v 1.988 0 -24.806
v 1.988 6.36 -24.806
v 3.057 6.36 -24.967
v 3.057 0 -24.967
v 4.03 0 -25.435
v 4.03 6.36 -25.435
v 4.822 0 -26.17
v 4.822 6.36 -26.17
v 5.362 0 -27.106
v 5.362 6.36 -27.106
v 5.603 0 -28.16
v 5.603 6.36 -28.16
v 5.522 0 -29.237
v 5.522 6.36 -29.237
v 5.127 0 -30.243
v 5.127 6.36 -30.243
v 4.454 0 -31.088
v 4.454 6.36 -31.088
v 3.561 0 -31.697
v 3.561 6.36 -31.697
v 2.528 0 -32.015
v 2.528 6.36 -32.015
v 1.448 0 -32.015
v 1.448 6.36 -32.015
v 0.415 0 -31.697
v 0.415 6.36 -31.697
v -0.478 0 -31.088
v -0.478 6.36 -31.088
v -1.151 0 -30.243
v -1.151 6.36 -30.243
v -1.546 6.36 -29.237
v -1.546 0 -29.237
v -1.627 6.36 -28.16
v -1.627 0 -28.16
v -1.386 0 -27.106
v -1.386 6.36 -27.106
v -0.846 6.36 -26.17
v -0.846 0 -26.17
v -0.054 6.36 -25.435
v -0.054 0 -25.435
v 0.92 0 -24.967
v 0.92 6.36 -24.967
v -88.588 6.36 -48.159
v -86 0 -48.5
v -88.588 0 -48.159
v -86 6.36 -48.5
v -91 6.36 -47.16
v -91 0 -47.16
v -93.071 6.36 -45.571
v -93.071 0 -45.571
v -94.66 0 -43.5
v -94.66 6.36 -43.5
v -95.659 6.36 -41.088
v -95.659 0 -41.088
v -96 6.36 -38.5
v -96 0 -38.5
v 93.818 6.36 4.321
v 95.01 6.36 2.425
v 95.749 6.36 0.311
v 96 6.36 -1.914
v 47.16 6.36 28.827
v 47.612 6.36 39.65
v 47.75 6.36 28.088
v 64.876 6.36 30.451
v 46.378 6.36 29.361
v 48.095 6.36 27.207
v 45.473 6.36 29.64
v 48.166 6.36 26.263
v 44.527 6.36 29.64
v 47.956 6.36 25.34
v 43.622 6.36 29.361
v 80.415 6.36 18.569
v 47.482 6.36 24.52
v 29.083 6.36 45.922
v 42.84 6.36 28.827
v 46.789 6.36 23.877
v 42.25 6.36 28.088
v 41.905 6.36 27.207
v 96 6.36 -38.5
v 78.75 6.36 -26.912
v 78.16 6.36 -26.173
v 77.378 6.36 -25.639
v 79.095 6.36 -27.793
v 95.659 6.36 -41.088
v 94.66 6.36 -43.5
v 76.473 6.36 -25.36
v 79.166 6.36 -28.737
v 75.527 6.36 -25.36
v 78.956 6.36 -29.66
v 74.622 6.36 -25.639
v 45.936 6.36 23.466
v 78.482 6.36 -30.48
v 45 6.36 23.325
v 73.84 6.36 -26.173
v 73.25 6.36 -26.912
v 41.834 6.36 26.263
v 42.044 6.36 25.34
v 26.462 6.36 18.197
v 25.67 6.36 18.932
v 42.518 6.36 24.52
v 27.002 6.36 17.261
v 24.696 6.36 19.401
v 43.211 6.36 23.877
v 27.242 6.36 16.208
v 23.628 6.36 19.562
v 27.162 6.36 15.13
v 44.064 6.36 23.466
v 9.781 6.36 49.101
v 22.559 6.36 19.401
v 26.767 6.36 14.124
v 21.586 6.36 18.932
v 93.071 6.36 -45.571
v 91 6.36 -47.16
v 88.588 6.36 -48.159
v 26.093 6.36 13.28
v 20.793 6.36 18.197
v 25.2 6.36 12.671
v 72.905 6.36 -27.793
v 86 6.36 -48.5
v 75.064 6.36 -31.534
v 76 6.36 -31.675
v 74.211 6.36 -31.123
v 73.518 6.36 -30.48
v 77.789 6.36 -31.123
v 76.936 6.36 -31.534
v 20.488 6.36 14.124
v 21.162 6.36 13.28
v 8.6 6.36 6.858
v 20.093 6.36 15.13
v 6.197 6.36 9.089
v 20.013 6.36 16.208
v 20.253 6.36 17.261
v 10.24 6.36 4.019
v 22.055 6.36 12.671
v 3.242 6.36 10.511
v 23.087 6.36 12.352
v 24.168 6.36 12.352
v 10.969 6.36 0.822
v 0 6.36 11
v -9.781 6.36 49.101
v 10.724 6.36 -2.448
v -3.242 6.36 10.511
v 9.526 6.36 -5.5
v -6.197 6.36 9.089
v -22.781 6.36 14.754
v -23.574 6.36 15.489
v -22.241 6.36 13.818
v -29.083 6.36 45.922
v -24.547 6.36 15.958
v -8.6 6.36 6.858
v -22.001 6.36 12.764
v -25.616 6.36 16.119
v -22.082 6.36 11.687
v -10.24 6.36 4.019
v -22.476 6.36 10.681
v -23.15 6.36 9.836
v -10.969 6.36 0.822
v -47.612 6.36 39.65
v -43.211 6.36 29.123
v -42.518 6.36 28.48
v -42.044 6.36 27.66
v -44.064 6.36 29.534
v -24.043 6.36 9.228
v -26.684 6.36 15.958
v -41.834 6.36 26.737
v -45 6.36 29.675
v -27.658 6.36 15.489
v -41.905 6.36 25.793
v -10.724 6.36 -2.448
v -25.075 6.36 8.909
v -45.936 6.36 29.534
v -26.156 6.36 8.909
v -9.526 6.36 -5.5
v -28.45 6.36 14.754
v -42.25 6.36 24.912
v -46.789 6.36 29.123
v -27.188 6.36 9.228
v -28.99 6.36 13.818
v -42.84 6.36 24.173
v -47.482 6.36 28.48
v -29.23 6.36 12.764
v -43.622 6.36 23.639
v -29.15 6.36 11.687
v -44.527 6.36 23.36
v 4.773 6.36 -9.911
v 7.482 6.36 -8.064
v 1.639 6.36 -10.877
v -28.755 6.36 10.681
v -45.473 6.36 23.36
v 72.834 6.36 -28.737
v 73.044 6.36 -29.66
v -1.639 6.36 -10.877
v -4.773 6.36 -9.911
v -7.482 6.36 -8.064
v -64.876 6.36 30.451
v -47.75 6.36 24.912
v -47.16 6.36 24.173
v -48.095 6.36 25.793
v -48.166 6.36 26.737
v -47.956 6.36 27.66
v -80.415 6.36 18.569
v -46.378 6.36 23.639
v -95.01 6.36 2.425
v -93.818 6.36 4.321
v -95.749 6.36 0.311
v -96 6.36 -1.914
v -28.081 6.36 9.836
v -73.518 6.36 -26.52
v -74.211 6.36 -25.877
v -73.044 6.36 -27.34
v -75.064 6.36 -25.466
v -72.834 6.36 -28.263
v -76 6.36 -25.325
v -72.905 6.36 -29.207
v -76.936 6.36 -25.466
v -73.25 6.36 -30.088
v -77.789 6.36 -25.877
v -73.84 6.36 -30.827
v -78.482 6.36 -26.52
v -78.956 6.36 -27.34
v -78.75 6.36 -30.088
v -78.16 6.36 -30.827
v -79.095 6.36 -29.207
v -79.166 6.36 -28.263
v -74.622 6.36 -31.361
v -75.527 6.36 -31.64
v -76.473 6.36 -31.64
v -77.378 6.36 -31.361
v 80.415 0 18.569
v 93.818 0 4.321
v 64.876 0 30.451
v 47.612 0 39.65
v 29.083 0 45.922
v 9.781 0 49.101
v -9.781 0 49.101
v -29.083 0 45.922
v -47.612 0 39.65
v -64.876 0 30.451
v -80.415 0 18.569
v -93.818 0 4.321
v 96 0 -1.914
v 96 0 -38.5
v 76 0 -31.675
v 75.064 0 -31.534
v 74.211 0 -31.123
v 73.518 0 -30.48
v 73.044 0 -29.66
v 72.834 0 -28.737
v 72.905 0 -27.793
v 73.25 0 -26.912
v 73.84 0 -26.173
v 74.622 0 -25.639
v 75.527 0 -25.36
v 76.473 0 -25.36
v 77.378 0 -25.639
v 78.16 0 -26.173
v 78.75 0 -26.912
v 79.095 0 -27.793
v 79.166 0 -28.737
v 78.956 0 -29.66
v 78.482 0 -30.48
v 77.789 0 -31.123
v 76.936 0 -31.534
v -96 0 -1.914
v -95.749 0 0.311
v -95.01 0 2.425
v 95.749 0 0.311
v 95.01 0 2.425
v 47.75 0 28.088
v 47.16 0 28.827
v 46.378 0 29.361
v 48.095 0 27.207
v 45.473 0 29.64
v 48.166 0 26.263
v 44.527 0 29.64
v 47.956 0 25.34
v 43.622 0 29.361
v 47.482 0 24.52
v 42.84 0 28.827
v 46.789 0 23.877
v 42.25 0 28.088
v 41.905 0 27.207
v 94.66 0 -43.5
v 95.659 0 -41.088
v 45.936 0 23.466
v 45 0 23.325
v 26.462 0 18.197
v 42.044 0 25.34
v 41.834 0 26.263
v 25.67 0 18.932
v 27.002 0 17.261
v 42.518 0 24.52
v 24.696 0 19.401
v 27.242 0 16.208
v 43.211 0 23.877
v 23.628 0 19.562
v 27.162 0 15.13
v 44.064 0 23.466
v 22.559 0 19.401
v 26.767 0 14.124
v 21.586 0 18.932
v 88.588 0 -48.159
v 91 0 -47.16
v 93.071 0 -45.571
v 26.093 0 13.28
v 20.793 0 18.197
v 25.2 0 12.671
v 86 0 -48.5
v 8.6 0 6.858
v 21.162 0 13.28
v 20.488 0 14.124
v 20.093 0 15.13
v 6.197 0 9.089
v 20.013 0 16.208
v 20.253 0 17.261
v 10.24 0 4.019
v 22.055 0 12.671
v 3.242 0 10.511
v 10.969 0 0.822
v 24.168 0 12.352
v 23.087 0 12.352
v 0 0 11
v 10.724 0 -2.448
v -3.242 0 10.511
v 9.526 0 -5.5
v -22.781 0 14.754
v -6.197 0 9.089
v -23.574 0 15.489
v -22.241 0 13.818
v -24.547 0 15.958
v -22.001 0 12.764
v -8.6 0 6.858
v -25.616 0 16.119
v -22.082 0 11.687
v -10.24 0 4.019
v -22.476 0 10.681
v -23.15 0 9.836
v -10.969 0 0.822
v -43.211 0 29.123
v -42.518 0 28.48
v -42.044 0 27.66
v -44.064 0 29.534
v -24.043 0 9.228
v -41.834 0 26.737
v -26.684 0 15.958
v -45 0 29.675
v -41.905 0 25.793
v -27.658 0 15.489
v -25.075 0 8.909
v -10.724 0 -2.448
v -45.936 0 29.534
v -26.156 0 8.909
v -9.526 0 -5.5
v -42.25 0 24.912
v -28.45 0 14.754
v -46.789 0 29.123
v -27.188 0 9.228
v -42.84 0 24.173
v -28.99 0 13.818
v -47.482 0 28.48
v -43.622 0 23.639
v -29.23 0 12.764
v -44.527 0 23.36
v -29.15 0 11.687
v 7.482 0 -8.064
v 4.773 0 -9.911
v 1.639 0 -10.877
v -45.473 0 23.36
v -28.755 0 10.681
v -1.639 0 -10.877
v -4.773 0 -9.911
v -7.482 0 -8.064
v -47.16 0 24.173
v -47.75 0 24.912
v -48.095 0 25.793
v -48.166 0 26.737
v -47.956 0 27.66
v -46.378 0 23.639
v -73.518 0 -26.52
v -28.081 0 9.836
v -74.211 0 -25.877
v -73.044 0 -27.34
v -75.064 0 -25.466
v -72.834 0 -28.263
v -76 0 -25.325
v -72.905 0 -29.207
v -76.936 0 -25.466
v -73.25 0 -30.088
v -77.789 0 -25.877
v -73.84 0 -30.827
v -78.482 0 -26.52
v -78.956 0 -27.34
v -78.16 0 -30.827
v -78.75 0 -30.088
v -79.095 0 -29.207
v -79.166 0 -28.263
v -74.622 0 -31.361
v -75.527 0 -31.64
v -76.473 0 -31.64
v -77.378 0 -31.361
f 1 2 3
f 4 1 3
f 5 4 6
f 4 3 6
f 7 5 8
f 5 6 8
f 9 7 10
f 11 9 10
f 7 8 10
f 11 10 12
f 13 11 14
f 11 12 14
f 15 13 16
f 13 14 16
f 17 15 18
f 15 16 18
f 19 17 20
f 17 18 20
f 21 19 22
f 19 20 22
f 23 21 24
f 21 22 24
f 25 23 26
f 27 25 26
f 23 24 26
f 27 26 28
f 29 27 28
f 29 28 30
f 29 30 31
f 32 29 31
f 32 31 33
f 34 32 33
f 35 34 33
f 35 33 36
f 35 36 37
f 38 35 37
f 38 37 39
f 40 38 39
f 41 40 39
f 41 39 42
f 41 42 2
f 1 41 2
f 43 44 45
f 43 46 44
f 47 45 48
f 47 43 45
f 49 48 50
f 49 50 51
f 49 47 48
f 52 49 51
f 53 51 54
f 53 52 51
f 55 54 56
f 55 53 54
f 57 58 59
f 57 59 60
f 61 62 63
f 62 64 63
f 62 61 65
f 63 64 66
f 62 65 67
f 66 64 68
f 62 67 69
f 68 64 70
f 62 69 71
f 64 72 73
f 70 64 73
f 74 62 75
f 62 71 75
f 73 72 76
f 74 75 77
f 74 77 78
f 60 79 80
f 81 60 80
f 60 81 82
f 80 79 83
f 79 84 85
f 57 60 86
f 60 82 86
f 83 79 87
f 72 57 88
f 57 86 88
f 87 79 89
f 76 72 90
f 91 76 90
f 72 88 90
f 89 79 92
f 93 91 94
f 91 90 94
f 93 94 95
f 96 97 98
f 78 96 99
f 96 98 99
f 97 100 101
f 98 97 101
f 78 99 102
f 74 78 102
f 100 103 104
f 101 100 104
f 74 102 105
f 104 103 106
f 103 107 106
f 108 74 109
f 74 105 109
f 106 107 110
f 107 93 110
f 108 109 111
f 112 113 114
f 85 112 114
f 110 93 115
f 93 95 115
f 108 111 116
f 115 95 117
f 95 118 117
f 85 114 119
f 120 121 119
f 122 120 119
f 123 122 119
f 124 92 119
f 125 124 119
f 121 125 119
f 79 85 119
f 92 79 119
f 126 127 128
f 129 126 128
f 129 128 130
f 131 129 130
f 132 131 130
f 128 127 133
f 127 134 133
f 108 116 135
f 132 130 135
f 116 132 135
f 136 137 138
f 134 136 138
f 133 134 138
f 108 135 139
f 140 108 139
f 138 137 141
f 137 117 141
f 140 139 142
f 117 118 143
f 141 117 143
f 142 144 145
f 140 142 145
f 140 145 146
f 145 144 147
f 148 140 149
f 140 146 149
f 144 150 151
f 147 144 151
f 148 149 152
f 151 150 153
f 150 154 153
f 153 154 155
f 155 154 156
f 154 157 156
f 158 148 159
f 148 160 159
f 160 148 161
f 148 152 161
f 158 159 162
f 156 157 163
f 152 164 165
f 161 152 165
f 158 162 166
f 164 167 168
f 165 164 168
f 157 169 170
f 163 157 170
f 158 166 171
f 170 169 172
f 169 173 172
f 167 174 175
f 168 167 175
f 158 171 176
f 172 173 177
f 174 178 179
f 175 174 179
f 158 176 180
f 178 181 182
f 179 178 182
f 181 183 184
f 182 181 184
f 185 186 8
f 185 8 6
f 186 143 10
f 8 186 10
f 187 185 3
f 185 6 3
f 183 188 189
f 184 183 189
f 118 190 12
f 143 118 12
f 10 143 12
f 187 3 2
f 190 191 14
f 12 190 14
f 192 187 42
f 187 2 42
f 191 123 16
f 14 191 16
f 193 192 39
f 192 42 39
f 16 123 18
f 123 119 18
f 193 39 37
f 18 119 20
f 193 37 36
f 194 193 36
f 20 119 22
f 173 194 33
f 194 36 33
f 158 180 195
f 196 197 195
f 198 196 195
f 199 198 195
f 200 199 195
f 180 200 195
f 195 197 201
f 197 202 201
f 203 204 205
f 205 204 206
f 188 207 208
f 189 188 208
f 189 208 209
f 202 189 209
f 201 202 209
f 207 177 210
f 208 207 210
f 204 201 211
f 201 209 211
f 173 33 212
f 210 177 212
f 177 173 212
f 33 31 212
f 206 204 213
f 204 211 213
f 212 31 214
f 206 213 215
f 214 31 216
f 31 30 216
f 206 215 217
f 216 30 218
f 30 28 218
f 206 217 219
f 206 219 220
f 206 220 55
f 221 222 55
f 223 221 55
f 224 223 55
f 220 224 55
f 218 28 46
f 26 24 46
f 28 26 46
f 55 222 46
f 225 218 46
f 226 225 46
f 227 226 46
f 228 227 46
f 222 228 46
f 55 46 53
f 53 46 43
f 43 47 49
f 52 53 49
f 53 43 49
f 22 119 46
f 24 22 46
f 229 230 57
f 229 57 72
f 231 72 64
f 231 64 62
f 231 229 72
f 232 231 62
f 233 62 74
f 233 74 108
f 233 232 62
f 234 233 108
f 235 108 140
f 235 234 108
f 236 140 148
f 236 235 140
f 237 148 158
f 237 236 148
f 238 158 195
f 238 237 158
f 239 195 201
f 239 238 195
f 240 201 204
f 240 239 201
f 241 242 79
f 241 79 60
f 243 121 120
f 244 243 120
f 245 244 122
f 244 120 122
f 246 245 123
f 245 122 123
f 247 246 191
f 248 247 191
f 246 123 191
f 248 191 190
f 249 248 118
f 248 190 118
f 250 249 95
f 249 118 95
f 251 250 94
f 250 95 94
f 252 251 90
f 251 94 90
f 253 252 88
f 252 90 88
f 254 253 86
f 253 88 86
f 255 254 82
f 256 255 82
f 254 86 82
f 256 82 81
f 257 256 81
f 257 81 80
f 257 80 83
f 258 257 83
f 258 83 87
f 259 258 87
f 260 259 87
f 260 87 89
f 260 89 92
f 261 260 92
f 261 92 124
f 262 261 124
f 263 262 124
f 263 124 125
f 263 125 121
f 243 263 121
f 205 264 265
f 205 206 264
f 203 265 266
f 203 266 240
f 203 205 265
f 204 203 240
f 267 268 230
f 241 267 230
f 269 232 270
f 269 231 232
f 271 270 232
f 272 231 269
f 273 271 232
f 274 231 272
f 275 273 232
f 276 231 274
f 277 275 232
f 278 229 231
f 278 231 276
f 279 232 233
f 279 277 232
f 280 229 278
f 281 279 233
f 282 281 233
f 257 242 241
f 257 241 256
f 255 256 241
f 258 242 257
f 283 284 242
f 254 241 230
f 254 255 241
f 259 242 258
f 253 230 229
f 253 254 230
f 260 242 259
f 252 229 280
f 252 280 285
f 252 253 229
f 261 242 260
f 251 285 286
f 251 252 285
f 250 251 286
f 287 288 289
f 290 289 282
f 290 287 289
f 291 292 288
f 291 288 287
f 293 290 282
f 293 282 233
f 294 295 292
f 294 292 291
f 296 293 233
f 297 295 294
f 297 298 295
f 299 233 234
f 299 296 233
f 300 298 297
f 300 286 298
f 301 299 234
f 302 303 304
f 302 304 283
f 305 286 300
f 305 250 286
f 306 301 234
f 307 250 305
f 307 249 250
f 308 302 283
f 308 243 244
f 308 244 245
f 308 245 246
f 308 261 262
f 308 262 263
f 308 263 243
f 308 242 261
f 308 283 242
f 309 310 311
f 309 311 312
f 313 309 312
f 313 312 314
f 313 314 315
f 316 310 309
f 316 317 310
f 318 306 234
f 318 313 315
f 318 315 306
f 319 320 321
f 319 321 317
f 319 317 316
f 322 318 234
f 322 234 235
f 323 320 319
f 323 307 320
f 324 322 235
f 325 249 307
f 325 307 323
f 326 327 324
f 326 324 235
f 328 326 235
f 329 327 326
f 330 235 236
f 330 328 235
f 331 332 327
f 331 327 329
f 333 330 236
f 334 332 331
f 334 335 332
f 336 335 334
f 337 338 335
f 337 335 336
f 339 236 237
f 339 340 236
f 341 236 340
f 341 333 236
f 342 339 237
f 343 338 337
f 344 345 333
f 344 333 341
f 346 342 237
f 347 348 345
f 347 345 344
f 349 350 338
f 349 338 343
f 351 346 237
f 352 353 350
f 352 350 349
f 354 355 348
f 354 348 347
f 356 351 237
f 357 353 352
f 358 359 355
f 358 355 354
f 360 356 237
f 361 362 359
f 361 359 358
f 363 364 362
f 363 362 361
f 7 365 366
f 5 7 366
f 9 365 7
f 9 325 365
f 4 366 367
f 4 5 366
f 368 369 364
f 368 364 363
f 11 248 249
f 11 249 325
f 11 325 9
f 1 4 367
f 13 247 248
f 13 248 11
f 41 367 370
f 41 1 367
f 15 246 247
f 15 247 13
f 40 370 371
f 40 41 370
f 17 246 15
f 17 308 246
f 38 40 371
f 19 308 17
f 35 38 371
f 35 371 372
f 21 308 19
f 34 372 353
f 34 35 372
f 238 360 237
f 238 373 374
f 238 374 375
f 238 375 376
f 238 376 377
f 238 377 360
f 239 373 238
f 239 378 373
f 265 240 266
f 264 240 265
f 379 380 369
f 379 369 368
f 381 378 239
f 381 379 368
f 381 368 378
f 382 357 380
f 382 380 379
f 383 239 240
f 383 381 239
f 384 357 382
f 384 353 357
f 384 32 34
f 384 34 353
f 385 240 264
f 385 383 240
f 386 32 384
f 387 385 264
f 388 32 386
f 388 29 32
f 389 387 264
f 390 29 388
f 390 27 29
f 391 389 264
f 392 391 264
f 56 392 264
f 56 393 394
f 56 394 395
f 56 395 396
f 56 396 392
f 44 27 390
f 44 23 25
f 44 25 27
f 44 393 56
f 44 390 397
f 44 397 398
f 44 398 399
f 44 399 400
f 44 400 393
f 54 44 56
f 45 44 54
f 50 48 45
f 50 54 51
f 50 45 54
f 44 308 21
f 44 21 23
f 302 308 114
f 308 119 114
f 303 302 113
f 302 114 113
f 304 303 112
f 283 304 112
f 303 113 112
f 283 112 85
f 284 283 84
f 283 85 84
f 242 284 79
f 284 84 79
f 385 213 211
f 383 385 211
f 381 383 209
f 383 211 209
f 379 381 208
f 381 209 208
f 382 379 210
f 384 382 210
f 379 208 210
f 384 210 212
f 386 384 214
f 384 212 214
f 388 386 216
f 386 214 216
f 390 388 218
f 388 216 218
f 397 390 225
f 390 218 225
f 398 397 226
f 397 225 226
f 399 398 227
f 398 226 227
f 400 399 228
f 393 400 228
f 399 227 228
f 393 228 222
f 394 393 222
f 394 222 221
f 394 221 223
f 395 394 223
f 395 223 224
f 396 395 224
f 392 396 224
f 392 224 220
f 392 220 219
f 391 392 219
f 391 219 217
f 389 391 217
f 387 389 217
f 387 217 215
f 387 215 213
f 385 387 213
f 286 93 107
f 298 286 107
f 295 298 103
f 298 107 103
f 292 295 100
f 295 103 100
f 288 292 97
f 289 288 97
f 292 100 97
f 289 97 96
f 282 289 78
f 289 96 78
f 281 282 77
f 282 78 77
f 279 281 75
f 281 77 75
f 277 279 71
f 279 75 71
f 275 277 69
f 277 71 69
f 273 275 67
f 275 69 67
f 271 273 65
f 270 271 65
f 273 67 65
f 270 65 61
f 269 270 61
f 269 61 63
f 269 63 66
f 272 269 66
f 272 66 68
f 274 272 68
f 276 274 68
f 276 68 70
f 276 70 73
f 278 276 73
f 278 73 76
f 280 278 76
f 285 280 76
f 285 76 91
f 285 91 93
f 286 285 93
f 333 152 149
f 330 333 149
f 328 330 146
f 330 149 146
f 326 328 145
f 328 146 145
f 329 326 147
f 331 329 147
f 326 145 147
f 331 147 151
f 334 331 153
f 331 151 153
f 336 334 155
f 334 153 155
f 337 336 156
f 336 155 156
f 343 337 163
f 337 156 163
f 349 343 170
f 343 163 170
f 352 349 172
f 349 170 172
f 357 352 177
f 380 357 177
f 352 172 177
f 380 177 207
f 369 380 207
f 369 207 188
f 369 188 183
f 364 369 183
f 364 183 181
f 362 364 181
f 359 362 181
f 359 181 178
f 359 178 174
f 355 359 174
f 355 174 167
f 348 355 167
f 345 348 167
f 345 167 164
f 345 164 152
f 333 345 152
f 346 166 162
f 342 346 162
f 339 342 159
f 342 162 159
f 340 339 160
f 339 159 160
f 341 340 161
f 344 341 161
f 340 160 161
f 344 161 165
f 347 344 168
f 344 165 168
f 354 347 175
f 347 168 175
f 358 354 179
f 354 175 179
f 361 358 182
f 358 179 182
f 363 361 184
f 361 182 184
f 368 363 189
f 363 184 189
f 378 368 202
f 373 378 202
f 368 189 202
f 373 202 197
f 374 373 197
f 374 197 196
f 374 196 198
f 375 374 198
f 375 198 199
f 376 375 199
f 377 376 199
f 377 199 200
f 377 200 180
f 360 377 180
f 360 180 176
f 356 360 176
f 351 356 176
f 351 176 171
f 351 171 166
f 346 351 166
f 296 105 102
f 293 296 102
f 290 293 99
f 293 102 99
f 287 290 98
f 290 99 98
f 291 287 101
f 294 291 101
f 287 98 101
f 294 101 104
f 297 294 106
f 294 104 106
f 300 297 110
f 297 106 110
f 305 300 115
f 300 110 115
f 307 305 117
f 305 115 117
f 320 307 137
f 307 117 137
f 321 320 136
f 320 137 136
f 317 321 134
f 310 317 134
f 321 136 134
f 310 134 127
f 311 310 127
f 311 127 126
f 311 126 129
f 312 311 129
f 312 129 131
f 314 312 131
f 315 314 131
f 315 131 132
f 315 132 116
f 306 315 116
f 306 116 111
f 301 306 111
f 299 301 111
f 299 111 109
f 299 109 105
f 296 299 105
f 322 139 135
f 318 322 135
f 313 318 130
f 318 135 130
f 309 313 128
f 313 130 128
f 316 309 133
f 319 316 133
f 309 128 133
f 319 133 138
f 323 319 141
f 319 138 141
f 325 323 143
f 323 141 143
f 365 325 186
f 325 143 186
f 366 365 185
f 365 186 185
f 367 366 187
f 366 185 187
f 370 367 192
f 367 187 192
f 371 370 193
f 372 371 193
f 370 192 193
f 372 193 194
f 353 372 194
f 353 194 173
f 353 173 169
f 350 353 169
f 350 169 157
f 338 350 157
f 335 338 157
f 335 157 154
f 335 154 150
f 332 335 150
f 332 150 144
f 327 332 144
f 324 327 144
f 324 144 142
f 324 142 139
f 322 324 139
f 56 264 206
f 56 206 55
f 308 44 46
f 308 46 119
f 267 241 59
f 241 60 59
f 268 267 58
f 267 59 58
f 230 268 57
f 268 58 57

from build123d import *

# Parameters (mm, degrees)
SKETCH5_R           = 38.5
BOSS_EXTRUDE2_DEPTH = 6.36
SKETCH8_R           = 11
CUT_EXTRUDE4_DEPTH  = 55.817420589
BOSS_EXTRUDE3_START = -6.36
SKETCH9_R           = 38.5
BOSS_EXTRUDE3_DEPTH = 6.36
SKETCH10_R          = 3.175
CUT_EXTRUDE5_DEPTH  = 109.197502744
SKETCH12_R          = 3.625
CUT_EXTRUDE6_DEPTH  = 109.197502744
FILLET1_R           = 10


with BuildPart() as part:
    # Sketch5 → Boss-Extrude2 (new body)
    with BuildSketch(Plane(origin=(0, 0, 0), x_dir=(1, 0, 0), z_dir=(0, 1, 0))):
        with Locations(Location((0, 0, 0), (0, 0, 90))):
            Circle(SKETCH5_R)
    extrude(amount=BOSS_EXTRUDE2_DEPTH)

    # Sketch8 → Cut-Extrude4 (cut, through all)
    with BuildSketch(Plane(origin=(0, 6.36, 0), x_dir=(1, 0, 0), z_dir=(0, 1, 0))):
        with Locations(Location((0, 0, 0), (0, 0, 270))):
            Circle(SKETCH8_R)
    extrude(amount=-CUT_EXTRUDE4_DEPTH, mode=Mode.SUBTRACT)

    # Sketch9 → Boss-Extrude3 (add)
    with BuildSketch(Plane(origin=(0, 6.36, 0), x_dir=(1, 0, 0), z_dir=(0, 1, 0)).offset(BOSS_EXTRUDE3_START)):
        with BuildLine():
            Line((-96, 48.5), (96, 48.5))
            Line((96, 48.5), (96, -1.5))
            ThreePointArc((96, -1.5), (0, -49.5), (-96, -1.5))
            Line((-96, -1.5), (-96, 48.5))
        make_face()
        Circle(SKETCH9_R, mode=Mode.SUBTRACT)
    extrude(amount=BOSS_EXTRUDE3_DEPTH)

    # Sketch10 → Cut-Extrude5 (cut, through all)
    with BuildSketch(Plane(origin=(0, 6.36, 0), x_dir=(1, 0, 0), z_dir=(0, 1, 0))):
        with Locations(Location((-76, 28.5, 0), (0, 0, 270))):
            Circle(SKETCH10_R)
        with Locations(Location((-45, -26.5, 0), (0, 0, 270))):
            Circle(SKETCH10_R)
        with Locations(Location((45, -26.5, 0), (0, 0, 90))):
            Circle(SKETCH10_R)
        with Locations(Location((76, 28.5, 0), (0, 0, 90))):
            Circle(SKETCH10_R)
    extrude(amount=-CUT_EXTRUDE5_DEPTH, mode=Mode.SUBTRACT)

    # Sketch12 → Cut-Extrude6 (cut, through all)
    with BuildSketch(Plane(origin=(0, 6.36, 0), x_dir=(1, 0, 0), z_dir=(0, 1, 0))):
        with Locations(Location((1.988059502, 28.430575432, 0), (0, 0, 270))):
            Circle(SKETCH12_R)
        with Locations(Location((23.627570818, -15.936997749, 0), (0, 0, 270))):
            Circle(SKETCH12_R)
        with Locations(Location((-25.61563032, -12.493577683, 0), (0, 0, 270))):
            Circle(SKETCH12_R)
    extrude(amount=-CUT_EXTRUDE6_DEPTH, mode=Mode.SUBTRACT)

    # Fillet1
    fillet1_edges = [part.edges().sort_by_distance(p)[0] for p in [
        (96, 3.18, 1.5),
        (96, 3.18, -48.5),
        (-96, 3.18, -48.5),
        (-96, 3.18, 1.5),
    ]]
    fillet(fillet1_edges, radius=FILLET1_R)


solid = part.part
